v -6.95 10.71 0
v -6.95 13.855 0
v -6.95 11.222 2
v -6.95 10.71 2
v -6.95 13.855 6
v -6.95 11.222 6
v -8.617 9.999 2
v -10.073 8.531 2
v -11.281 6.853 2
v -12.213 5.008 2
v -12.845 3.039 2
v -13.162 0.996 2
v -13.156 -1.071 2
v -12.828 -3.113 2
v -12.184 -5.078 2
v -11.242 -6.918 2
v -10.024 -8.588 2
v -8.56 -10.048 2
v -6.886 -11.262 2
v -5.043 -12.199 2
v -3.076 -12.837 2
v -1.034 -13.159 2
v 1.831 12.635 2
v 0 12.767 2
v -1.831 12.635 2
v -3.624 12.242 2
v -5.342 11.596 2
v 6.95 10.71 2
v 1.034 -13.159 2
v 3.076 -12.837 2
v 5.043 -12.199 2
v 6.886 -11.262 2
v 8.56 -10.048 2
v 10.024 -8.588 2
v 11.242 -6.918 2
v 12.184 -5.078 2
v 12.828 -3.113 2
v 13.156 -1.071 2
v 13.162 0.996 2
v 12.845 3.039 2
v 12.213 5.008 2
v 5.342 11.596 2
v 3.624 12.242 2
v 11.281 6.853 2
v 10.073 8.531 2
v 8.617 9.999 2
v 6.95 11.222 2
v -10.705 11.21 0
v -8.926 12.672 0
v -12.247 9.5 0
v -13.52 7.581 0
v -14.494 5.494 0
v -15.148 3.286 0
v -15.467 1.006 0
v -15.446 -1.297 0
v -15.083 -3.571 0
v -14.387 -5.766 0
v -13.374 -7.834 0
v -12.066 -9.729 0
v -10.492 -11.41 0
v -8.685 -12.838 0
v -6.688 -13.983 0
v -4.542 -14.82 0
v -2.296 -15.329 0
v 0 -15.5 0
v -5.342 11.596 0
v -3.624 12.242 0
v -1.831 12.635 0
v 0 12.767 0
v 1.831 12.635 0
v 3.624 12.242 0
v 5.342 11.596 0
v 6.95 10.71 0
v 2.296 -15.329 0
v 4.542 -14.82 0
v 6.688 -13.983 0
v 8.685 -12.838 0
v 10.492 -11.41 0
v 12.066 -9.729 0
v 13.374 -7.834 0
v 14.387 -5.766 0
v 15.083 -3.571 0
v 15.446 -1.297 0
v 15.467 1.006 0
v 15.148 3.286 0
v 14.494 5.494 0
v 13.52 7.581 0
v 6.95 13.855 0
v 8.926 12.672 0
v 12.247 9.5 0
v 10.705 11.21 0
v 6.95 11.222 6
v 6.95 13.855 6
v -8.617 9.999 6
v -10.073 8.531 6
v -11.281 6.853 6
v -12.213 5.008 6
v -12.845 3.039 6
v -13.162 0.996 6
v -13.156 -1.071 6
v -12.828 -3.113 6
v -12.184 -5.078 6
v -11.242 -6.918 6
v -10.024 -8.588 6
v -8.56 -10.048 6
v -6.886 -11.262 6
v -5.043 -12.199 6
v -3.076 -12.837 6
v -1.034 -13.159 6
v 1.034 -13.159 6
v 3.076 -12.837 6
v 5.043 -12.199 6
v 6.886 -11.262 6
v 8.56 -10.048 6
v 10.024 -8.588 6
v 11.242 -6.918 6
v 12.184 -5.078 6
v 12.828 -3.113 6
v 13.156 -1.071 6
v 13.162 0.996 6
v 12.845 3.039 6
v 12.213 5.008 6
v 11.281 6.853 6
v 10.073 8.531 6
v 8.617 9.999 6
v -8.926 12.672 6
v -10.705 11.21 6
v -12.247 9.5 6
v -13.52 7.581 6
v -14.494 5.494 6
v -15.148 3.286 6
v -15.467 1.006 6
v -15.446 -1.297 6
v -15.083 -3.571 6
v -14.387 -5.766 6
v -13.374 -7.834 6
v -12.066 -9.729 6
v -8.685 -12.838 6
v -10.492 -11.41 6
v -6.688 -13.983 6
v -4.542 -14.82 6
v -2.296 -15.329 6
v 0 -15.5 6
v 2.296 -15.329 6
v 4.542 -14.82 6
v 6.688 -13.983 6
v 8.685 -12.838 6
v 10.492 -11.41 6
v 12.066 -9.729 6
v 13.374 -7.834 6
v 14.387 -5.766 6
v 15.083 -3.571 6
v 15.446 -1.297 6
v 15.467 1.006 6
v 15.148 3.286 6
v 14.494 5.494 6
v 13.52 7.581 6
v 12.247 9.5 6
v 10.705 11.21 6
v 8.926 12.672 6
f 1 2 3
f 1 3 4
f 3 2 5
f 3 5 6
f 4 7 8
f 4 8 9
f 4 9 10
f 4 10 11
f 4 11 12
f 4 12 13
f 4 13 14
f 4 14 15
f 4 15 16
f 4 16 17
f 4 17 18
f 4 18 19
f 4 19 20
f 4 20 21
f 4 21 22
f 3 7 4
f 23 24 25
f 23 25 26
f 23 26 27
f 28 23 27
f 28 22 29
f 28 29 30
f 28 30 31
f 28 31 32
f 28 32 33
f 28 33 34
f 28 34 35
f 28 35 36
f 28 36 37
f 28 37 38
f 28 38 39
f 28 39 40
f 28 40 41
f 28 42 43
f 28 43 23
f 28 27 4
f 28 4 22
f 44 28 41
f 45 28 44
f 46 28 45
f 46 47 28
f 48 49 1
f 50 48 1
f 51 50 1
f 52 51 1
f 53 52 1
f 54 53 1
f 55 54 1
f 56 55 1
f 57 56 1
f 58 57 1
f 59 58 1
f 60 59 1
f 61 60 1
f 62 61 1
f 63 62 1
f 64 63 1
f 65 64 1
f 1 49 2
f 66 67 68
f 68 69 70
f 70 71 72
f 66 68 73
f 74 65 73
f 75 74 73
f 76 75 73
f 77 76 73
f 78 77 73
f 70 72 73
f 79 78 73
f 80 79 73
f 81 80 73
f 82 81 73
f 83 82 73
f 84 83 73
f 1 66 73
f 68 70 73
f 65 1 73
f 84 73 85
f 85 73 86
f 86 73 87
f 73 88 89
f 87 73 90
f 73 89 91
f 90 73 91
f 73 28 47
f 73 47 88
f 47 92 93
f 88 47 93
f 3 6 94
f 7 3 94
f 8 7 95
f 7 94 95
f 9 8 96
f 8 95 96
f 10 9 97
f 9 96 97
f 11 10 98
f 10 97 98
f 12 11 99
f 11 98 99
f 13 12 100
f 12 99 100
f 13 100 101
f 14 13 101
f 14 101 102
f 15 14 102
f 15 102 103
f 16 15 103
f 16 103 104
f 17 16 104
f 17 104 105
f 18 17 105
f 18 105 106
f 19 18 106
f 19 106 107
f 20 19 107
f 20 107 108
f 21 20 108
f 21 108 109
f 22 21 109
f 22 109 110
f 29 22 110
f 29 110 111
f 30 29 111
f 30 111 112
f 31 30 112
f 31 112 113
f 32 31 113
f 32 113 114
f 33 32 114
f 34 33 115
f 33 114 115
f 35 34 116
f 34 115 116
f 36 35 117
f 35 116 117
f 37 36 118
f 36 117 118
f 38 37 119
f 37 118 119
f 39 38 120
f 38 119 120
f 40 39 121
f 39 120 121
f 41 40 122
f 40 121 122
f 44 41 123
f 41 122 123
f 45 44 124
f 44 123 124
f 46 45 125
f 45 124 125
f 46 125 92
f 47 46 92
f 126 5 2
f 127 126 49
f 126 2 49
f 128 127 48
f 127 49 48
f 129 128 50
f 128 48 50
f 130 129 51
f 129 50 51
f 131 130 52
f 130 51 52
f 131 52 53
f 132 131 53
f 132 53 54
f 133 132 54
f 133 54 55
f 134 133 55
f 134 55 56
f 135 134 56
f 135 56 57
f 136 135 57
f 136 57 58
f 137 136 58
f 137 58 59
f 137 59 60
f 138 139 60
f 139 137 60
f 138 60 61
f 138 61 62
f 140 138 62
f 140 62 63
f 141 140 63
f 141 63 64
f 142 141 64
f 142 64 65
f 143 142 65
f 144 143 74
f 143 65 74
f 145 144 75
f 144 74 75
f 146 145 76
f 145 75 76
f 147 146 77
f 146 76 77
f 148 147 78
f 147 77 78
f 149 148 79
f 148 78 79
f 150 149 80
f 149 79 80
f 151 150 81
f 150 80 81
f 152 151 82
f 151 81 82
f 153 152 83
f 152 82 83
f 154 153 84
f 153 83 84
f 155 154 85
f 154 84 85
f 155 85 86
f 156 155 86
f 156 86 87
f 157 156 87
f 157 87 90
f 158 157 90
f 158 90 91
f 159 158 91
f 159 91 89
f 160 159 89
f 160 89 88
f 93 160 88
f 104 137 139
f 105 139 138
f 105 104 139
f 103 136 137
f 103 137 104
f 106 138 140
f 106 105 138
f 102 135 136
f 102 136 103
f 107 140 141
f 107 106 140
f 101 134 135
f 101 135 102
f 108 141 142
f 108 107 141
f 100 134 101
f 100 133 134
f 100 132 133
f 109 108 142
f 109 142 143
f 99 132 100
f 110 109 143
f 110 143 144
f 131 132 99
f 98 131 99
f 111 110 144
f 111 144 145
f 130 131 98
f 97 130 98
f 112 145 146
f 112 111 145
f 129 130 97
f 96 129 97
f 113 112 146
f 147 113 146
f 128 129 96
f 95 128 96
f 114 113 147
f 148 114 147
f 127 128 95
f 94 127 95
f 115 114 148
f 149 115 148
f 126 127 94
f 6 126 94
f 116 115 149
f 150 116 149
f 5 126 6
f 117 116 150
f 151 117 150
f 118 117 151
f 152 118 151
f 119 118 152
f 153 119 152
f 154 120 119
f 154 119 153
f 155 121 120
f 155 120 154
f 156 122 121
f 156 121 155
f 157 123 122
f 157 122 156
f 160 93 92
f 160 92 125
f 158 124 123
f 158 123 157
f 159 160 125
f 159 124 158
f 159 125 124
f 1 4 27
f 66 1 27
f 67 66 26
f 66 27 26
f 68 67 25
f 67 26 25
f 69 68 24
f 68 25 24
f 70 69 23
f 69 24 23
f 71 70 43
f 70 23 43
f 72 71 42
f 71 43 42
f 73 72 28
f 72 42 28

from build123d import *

# Parameters (mm, degrees)
F0_R     = 15.5
F1_DEPTH = 6
F2_R     = 13.2
F3_DEPTH = 4
F5_DEPTH = 25


with BuildPart() as f1:
    # F0 (on Top) → F1 (new body)
    with BuildSketch(Plane.XY):
        Circle(F0_R)
    extrude(amount=F1_DEPTH)

    # F2 (on face) → F3 (cut)
    with BuildSketch(Plane.XY.offset(6)):
        Circle(F2_R)
    extrude(amount=-F3_DEPTH, mode=Mode.SUBTRACT)

    # F4 (on face) → F5 (cut)
    with BuildSketch(Plane.XY.offset(6)):
        with BuildLine():
            Line((6.95, 21.574851), (-6.95, 21.574851))
            Line((-6.95, 21.574851), (-6.95, 10.710004))
            ThreePointArc((-6.95, 10.710004), (0, 12.767407), (6.95, 10.710004))
            Line((6.95, 10.710004), (6.95, 21.574851))
        make_face()
    extrude(amount=-F5_DEPTH, mode=Mode.SUBTRACT)


solid = f1.part
